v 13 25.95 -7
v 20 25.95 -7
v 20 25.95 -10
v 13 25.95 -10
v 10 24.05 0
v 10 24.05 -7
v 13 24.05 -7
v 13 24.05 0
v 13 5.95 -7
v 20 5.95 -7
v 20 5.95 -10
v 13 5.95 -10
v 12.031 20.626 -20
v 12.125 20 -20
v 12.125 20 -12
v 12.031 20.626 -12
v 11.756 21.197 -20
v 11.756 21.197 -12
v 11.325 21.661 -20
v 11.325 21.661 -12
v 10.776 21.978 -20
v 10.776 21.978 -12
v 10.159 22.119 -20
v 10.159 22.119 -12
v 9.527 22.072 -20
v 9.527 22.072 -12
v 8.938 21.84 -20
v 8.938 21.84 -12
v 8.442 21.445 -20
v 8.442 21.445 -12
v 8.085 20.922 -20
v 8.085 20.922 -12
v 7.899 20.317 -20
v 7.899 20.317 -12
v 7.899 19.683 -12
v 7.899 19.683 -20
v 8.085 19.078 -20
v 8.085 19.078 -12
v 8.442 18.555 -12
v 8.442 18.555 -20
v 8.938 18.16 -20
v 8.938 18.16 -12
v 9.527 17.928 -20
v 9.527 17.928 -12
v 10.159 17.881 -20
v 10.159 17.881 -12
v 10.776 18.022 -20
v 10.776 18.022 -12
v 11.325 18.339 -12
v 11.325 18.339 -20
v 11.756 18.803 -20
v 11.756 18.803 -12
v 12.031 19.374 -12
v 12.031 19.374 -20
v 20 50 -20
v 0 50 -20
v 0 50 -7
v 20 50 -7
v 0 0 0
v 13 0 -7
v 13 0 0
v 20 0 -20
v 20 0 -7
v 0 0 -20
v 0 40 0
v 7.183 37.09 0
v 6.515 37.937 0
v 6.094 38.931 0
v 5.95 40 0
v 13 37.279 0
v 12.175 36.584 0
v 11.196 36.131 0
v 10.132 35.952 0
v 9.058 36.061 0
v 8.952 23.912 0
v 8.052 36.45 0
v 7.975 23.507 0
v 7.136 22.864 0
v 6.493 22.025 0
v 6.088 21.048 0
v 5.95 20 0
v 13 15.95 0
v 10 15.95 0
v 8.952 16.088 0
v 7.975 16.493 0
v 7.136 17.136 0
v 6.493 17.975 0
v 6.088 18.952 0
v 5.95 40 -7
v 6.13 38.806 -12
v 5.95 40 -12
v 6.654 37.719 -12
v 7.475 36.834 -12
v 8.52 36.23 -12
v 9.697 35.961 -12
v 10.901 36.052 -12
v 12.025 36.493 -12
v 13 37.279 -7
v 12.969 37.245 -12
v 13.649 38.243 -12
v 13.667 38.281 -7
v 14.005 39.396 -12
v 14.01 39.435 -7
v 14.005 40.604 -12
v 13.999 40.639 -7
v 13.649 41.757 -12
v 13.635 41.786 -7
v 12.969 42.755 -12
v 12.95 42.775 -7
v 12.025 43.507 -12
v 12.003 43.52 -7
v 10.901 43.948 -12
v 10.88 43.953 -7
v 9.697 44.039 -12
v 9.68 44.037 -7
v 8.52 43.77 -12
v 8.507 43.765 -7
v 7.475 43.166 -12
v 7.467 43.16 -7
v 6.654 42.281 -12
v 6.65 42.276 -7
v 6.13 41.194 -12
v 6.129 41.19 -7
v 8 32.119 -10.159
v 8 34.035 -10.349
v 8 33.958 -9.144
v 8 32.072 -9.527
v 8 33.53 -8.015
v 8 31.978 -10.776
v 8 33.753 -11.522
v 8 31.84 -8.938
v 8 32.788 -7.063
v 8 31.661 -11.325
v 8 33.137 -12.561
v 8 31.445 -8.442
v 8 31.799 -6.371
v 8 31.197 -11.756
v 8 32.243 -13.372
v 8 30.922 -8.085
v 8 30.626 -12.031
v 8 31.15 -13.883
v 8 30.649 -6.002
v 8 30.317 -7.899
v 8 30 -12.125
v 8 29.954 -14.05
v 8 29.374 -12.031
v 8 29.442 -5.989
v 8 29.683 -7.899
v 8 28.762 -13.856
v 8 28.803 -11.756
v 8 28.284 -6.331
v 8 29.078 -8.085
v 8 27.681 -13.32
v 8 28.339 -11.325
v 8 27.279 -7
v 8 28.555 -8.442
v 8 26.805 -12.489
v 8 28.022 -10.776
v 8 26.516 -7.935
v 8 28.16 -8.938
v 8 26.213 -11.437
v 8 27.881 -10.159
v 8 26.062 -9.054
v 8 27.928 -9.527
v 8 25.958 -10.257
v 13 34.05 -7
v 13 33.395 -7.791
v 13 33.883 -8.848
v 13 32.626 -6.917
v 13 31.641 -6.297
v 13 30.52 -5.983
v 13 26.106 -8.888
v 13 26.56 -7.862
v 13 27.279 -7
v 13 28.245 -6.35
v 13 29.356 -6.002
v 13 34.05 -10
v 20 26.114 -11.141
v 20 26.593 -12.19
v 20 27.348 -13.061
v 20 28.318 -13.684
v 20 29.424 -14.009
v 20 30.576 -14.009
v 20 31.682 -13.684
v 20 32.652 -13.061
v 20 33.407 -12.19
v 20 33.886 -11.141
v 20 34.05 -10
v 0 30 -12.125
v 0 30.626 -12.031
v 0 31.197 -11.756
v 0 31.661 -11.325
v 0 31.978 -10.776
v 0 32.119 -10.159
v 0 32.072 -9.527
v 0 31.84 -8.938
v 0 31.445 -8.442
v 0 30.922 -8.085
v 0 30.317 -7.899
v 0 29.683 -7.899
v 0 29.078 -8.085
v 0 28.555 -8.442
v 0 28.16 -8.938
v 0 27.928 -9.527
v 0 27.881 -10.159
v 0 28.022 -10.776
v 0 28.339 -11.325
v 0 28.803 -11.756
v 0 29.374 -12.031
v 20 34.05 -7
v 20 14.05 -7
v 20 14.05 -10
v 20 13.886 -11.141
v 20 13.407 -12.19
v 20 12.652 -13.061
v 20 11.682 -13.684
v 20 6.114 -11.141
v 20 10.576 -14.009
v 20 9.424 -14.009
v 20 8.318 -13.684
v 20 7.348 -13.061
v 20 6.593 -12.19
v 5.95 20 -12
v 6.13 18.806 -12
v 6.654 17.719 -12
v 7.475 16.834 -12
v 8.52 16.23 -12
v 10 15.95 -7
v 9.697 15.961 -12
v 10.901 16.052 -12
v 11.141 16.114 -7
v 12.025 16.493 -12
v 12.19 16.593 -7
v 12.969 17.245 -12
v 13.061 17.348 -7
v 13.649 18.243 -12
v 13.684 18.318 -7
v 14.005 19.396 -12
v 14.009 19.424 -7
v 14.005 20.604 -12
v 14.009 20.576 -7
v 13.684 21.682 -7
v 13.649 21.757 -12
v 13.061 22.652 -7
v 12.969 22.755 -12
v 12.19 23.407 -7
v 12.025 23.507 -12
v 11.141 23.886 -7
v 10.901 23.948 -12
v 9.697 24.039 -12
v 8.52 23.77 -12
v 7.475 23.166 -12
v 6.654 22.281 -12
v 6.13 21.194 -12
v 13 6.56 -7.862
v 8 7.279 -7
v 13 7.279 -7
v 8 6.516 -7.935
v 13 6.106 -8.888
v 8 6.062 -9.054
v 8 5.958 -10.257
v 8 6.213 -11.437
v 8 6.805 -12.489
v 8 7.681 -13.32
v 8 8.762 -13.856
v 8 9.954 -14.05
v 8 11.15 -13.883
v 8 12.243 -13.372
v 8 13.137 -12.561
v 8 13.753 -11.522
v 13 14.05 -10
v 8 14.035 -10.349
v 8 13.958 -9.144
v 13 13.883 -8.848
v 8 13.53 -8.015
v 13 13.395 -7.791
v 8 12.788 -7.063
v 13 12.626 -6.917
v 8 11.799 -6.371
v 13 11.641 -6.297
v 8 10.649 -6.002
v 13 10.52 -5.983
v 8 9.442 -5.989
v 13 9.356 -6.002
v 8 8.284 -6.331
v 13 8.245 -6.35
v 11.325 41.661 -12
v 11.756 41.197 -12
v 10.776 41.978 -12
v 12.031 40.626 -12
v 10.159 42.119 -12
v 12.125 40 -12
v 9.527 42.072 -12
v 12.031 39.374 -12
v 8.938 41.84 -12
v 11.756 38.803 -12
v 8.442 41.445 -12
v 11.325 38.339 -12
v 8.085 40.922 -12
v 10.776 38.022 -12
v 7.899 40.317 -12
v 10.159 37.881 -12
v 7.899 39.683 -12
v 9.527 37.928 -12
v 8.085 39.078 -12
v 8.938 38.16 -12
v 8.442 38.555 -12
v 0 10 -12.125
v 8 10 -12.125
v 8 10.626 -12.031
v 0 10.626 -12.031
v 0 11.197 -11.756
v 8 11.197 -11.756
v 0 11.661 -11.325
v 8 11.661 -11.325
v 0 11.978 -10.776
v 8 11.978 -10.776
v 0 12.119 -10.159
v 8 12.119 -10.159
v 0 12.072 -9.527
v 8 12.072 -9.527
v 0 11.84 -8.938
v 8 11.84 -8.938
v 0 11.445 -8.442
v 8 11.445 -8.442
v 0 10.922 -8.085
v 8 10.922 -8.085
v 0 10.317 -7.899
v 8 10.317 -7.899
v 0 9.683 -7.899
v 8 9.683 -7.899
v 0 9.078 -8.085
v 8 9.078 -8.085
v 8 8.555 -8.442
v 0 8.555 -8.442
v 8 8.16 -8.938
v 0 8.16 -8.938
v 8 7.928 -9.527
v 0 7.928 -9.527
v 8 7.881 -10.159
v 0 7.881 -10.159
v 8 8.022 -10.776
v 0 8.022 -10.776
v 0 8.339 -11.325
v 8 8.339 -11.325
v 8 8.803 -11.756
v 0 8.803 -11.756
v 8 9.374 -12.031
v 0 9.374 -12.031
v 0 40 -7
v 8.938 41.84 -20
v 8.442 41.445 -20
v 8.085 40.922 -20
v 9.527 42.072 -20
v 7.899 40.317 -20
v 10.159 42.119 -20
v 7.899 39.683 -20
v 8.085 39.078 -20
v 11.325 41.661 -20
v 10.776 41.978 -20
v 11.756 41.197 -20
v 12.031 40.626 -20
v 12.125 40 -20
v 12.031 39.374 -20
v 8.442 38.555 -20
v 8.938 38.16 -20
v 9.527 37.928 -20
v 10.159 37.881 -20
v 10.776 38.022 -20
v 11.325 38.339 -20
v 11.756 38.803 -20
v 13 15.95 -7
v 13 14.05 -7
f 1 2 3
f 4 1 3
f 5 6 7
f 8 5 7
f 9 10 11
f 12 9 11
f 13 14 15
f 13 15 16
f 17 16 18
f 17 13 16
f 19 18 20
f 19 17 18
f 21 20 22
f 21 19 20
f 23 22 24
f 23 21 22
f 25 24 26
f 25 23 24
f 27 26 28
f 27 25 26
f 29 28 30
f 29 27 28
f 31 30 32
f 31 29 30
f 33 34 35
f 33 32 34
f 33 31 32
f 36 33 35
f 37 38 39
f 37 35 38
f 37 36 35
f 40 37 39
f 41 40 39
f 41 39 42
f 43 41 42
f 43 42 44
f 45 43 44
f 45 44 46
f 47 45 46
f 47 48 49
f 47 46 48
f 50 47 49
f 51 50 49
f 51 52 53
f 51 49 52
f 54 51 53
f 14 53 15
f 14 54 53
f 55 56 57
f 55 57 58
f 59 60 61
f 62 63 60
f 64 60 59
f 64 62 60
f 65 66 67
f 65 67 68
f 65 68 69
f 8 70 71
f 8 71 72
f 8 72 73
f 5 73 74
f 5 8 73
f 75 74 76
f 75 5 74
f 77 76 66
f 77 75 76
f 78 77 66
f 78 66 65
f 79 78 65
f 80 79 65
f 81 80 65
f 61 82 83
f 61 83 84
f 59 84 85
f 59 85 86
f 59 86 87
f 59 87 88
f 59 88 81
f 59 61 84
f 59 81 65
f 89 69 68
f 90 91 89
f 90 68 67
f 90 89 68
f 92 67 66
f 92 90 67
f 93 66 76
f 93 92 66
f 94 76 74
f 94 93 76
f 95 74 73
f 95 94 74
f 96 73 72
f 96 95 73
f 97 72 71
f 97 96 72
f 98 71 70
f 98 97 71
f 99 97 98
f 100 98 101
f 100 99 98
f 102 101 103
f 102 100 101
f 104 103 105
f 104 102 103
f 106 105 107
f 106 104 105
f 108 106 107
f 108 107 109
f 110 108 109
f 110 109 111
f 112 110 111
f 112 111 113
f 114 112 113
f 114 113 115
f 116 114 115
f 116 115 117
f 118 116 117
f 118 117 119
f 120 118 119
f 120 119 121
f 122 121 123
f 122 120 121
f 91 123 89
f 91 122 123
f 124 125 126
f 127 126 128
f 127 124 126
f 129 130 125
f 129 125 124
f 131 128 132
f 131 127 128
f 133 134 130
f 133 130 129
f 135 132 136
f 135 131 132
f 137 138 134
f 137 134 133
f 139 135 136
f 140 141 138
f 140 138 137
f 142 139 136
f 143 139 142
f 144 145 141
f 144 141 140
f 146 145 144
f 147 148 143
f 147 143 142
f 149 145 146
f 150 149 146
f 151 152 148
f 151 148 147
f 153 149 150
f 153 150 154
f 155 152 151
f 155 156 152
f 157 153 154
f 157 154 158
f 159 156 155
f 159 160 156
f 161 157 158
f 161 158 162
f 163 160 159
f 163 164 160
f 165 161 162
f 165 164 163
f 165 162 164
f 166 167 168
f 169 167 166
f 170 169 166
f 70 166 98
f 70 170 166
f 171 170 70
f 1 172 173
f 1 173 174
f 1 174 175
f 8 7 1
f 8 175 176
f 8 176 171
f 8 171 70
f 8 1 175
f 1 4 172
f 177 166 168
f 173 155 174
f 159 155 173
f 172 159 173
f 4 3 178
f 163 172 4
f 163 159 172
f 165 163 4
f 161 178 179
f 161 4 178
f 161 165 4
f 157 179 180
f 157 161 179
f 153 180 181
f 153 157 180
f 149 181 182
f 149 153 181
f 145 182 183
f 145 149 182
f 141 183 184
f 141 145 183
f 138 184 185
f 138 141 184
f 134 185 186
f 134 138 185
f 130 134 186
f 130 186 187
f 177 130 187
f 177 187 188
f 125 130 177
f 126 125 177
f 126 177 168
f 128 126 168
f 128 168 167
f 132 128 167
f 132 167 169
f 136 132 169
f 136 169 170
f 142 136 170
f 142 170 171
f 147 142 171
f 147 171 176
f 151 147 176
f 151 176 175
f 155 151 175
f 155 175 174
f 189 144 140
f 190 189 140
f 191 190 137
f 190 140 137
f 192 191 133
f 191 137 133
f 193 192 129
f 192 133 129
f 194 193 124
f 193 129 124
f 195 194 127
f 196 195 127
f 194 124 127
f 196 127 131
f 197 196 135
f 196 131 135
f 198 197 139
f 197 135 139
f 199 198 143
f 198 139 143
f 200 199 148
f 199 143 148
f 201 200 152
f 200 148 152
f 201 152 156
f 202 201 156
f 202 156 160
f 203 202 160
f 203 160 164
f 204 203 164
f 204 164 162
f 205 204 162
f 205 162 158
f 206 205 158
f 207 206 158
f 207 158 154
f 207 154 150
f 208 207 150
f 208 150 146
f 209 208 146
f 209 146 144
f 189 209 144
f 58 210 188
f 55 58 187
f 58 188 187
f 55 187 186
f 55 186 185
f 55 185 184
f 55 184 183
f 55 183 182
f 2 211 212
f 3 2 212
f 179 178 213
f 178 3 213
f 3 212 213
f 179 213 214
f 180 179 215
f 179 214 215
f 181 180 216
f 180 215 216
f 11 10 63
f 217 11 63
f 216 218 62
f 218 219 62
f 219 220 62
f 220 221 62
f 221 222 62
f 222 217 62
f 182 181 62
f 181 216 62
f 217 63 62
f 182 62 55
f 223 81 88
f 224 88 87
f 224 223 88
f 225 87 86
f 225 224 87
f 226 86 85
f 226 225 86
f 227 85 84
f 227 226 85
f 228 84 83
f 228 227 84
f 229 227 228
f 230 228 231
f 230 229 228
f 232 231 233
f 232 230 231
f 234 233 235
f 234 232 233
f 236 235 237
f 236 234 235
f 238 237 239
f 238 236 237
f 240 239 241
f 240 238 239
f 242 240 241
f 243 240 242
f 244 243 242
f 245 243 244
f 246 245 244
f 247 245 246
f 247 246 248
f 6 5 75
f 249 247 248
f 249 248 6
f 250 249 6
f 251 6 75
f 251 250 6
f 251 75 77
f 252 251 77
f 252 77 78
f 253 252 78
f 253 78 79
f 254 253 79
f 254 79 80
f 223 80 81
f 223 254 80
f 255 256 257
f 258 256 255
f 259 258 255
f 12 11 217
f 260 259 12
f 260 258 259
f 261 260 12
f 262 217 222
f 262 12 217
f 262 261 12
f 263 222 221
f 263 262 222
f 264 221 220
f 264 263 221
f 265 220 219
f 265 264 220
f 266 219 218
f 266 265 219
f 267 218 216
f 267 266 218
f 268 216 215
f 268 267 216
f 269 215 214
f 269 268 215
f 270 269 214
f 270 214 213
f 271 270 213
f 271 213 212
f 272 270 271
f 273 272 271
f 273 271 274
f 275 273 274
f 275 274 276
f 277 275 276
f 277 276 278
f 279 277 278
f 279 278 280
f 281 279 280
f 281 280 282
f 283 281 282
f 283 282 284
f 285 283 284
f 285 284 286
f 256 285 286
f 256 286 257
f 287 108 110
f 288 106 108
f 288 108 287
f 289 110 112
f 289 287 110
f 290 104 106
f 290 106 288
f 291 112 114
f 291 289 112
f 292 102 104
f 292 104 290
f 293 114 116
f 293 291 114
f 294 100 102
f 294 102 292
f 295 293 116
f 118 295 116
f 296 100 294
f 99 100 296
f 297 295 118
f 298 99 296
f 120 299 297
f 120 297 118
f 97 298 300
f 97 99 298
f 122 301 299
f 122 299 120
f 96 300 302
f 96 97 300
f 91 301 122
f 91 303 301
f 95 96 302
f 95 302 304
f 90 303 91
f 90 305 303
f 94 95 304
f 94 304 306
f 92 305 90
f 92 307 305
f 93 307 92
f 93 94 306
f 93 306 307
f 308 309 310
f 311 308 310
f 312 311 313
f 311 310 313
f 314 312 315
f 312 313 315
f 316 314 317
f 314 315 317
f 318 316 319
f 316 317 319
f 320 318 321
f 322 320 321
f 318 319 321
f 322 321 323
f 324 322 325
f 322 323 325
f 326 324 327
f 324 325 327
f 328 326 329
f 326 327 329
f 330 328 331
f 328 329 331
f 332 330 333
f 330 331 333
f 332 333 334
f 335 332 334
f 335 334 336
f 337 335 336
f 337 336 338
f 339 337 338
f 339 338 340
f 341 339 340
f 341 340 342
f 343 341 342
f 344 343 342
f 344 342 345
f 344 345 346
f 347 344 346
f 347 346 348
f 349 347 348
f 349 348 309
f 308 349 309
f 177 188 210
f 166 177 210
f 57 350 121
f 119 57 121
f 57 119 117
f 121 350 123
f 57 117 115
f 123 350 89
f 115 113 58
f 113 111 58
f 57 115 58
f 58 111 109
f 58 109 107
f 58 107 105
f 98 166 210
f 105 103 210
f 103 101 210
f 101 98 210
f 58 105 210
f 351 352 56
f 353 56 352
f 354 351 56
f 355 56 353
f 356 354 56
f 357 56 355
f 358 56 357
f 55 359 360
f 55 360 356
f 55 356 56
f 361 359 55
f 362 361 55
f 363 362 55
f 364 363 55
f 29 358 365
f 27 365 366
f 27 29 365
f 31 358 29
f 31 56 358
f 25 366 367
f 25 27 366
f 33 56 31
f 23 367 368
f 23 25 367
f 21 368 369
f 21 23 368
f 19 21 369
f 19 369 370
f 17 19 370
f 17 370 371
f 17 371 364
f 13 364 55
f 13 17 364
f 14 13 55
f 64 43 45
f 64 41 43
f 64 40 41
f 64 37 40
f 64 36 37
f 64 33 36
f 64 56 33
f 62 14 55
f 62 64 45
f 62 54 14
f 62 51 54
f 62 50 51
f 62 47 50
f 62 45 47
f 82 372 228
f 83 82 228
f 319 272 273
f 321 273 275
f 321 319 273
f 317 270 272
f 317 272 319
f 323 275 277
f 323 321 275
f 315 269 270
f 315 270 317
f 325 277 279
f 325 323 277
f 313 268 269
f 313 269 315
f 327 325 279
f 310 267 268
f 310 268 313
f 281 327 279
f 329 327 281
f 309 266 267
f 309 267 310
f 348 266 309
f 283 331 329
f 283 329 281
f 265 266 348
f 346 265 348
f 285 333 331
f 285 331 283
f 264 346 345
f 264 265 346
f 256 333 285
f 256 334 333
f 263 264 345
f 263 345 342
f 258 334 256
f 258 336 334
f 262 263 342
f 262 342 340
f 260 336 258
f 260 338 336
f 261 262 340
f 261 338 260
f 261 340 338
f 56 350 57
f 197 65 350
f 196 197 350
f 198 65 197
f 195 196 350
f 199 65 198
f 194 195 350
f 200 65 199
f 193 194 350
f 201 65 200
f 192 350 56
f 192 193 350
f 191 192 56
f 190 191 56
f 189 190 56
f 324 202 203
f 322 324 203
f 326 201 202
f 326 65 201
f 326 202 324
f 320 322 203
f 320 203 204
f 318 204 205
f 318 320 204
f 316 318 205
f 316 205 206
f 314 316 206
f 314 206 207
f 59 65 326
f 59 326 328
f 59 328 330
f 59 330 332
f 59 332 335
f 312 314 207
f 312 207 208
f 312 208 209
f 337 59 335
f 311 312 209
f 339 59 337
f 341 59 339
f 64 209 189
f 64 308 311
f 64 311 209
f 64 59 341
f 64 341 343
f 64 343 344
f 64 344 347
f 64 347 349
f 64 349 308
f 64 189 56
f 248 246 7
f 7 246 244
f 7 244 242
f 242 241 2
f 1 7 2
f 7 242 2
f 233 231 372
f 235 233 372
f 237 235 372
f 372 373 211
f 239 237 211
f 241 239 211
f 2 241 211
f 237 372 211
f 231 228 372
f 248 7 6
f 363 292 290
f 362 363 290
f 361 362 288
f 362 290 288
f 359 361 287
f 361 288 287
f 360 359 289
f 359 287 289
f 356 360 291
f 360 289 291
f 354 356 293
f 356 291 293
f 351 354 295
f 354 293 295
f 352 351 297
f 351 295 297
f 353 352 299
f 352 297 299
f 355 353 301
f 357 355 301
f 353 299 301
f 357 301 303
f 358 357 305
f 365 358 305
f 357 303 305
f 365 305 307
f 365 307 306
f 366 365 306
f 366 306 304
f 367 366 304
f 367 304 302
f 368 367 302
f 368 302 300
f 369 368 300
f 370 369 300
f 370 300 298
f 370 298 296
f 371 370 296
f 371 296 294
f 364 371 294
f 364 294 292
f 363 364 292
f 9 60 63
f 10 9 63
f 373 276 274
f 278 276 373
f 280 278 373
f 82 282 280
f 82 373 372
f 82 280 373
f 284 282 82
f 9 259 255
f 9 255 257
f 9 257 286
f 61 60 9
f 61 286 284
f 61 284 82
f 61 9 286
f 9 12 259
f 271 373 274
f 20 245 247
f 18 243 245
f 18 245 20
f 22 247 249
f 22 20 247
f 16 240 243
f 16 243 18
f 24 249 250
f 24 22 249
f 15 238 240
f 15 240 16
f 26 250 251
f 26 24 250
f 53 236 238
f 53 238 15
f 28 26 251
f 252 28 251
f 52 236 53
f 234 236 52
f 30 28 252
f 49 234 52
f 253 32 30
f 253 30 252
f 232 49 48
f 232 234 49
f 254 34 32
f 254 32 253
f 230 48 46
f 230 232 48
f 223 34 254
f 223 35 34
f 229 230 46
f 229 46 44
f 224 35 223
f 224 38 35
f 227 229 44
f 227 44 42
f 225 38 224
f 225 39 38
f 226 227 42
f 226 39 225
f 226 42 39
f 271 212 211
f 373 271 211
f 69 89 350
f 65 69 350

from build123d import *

# Parameters (mm, degrees)
SALIENTE_EXTRUIR1_DEPTH    = 40
CROQUIS2_W                 = 20
CROQUIS2_H                 = 13
SALIENTE_EXTRUIR2_DEPTH    = 10
CROQUIS3_R                 = 2.125
CORTAR_EXTRUIR1_DEPTH      = 56.398555938
CORTAR_EXTRUIR2_DEPTH      = 56.398555938
CORTAR_EXTRUIR2_DEPTH_BACK = 5
CROQUIS4_R                 = 4.05
CORTAR_EXTRUIR3_DEPTH      = 56.398555938
CORTAR_EXTRUIR3_DEPTH_BACK = 56.398555938
CROQUIS5_R                 = 2.125
CORTAR_EXTRUIR4_DEPTH      = 58.445626465
CORTAR_EXTRUIR4_DEPTH_BACK = 5
CORTAR_EXTRUIR4_START      = -7
CROQUIS6_R                 = 4.05
CORTAR_EXTRUIR5_START      = -7
CORTAR_EXTRUIR5_DEPTH      = 7
CORTAR_EXTRUIR6_DEPTH      = 7
CROQUIS9_R                 = 2.125
CORTAR_EXTRUIR7_DEPTH      = 58.445626465
CORTAR_EXTRUIR8_DEPTH      = 58.445626465
CORTAR_EXTRUIR8_DEPTH_BACK = 5
CORTAR_EXTRUIR8_START      = -7
CROQUIS10_R                = 4.05


with BuildPart() as part:
    # Croquis1 → Saliente-Extruir1 (new body)
    with BuildSketch(Plane(origin=(0, 0, 0), x_dir=(1, 0, 0), z_dir=(0, 1, 0))):
        Polygon((0, 0), (0, 20), (20, 20), (20, 7), (13, 7), (13, 0), align=None)
    extrude(amount=SALIENTE_EXTRUIR1_DEPTH)

    # Croquis2 → Saliente-Extruir2 (add)
    with BuildSketch(Plane(origin=(0, 40, 0), x_dir=(1, 0, 0), z_dir=(0, 1, 0))):
        with Locations((10, 13.5)):
            Rectangle(CROQUIS2_W, CROQUIS2_H)
    extrude(amount=SALIENTE_EXTRUIR2_DEPTH)

    # Croquis3 → Cortar-Extruir1 (cut, through all)
    with BuildSketch(Plane(origin=(13, 0, 0), x_dir=(0, 0, -1), z_dir=(1, 0, 0))):
        with Locations((10, 30)):
            Circle(CROQUIS3_R)
        with Locations((10, 10)):
            Circle(CROQUIS3_R)
    extrude(amount=-CORTAR_EXTRUIR1_DEPTH, mode=Mode.SUBTRACT)

    # Croquis4 → Cortar-Extruir2 (cut, two sides: drawn at the far end of the back side and taken through both)
    with BuildSketch(Plane(origin=(13, 0, 0), x_dir=(0, 0, -1), z_dir=(1, 0, 0)).offset(-CORTAR_EXTRUIR2_DEPTH_BACK)):
        with Locations(Location((10, 30, 0), (0, 0, 222.205446404))):
            Circle(CROQUIS4_R)
        with Locations(Location((10, 10, 0), (0, 0, 222.205446404))):
            Circle(CROQUIS4_R)
    extrude(amount=CORTAR_EXTRUIR2_DEPTH + CORTAR_EXTRUIR2_DEPTH_BACK, mode=Mode.SUBTRACT)

    # Croquis5 → Cortar-Extruir3 (cut, two sides: drawn at the far end of the back side and taken through both)
    with BuildSketch(Plane.XY.offset(-7).offset(-CORTAR_EXTRUIR3_DEPTH_BACK)):
        with Locations((10, 20)):
            Circle(CROQUIS5_R)
    extrude(amount=CORTAR_EXTRUIR3_DEPTH + CORTAR_EXTRUIR3_DEPTH_BACK, mode=Mode.SUBTRACT)

    # Croquis6 → Cortar-Extruir4 (cut, two sides: drawn at the far end of the back side and taken through both)
    with BuildSketch(Plane.XY.offset(CORTAR_EXTRUIR4_START - CORTAR_EXTRUIR4_DEPTH_BACK)):
        with Locations(Location((10, 20, 0), (0, 0, 180))):
            Circle(CROQUIS6_R)
    extrude(amount=CORTAR_EXTRUIR4_DEPTH + CORTAR_EXTRUIR4_DEPTH_BACK, mode=Mode.SUBTRACT)

    # Croquis7 → Cortar-Extruir5 (cut)
    with BuildSketch(Plane.XY.offset(CORTAR_EXTRUIR5_START)):
        with BuildLine():
            Line((10, 24.05), (18, 24.05))
            Line((18, 24.05), (18, 15.95))
            Line((18, 15.95), (10, 15.95))
            ThreePointArc((10, 15.95), (14.05, 20), (10, 24.05))
        make_face()
    extrude(amount=CORTAR_EXTRUIR5_DEPTH, mode=Mode.SUBTRACT)

    # Croquis8 → Cortar-Extruir6 (cut)
    with BuildSketch(Plane(origin=(20, 0, 0), x_dir=(0, 0, -1), z_dir=(1, 0, 0))):
        with BuildLine():
            Line((10, 34.05), (0, 34.05))
            Line((0, 34.05), (0, 25.95))
            Line((0, 25.95), (10, 25.95))
            ThreePointArc((10, 25.95), (5.95, 30), (10, 34.05))
        make_face()
        with BuildLine():
            Line((10, 14.05), (0, 14.05))
            Line((0, 14.05), (0, 5.95))
            Line((0, 5.95), (10, 5.95))
            ThreePointArc((10, 5.95), (5.95, 10), (10, 14.05))
        make_face()
    extrude(amount=-CORTAR_EXTRUIR6_DEPTH, mode=Mode.SUBTRACT)

    # Croquis9 → Cortar-Extruir7 (cut, through all)
    with BuildSketch(Plane.XY):
        with Locations((10, 40)):
            Circle(CROQUIS9_R)
    extrude(amount=-CORTAR_EXTRUIR7_DEPTH, mode=Mode.SUBTRACT)

    # Croquis10 → Cortar-Extruir8 (cut, two sides: drawn at the far end of the back side and taken through both)
    with BuildSketch(Plane.XY.offset(CORTAR_EXTRUIR8_START - CORTAR_EXTRUIR8_DEPTH_BACK)):
        with Locations(Location((10, 40, 0), (0, 0, 180))):
            Circle(CROQUIS10_R)
    extrude(amount=CORTAR_EXTRUIR8_DEPTH + CORTAR_EXTRUIR8_DEPTH_BACK, mode=Mode.SUBTRACT)


solid = part.part
